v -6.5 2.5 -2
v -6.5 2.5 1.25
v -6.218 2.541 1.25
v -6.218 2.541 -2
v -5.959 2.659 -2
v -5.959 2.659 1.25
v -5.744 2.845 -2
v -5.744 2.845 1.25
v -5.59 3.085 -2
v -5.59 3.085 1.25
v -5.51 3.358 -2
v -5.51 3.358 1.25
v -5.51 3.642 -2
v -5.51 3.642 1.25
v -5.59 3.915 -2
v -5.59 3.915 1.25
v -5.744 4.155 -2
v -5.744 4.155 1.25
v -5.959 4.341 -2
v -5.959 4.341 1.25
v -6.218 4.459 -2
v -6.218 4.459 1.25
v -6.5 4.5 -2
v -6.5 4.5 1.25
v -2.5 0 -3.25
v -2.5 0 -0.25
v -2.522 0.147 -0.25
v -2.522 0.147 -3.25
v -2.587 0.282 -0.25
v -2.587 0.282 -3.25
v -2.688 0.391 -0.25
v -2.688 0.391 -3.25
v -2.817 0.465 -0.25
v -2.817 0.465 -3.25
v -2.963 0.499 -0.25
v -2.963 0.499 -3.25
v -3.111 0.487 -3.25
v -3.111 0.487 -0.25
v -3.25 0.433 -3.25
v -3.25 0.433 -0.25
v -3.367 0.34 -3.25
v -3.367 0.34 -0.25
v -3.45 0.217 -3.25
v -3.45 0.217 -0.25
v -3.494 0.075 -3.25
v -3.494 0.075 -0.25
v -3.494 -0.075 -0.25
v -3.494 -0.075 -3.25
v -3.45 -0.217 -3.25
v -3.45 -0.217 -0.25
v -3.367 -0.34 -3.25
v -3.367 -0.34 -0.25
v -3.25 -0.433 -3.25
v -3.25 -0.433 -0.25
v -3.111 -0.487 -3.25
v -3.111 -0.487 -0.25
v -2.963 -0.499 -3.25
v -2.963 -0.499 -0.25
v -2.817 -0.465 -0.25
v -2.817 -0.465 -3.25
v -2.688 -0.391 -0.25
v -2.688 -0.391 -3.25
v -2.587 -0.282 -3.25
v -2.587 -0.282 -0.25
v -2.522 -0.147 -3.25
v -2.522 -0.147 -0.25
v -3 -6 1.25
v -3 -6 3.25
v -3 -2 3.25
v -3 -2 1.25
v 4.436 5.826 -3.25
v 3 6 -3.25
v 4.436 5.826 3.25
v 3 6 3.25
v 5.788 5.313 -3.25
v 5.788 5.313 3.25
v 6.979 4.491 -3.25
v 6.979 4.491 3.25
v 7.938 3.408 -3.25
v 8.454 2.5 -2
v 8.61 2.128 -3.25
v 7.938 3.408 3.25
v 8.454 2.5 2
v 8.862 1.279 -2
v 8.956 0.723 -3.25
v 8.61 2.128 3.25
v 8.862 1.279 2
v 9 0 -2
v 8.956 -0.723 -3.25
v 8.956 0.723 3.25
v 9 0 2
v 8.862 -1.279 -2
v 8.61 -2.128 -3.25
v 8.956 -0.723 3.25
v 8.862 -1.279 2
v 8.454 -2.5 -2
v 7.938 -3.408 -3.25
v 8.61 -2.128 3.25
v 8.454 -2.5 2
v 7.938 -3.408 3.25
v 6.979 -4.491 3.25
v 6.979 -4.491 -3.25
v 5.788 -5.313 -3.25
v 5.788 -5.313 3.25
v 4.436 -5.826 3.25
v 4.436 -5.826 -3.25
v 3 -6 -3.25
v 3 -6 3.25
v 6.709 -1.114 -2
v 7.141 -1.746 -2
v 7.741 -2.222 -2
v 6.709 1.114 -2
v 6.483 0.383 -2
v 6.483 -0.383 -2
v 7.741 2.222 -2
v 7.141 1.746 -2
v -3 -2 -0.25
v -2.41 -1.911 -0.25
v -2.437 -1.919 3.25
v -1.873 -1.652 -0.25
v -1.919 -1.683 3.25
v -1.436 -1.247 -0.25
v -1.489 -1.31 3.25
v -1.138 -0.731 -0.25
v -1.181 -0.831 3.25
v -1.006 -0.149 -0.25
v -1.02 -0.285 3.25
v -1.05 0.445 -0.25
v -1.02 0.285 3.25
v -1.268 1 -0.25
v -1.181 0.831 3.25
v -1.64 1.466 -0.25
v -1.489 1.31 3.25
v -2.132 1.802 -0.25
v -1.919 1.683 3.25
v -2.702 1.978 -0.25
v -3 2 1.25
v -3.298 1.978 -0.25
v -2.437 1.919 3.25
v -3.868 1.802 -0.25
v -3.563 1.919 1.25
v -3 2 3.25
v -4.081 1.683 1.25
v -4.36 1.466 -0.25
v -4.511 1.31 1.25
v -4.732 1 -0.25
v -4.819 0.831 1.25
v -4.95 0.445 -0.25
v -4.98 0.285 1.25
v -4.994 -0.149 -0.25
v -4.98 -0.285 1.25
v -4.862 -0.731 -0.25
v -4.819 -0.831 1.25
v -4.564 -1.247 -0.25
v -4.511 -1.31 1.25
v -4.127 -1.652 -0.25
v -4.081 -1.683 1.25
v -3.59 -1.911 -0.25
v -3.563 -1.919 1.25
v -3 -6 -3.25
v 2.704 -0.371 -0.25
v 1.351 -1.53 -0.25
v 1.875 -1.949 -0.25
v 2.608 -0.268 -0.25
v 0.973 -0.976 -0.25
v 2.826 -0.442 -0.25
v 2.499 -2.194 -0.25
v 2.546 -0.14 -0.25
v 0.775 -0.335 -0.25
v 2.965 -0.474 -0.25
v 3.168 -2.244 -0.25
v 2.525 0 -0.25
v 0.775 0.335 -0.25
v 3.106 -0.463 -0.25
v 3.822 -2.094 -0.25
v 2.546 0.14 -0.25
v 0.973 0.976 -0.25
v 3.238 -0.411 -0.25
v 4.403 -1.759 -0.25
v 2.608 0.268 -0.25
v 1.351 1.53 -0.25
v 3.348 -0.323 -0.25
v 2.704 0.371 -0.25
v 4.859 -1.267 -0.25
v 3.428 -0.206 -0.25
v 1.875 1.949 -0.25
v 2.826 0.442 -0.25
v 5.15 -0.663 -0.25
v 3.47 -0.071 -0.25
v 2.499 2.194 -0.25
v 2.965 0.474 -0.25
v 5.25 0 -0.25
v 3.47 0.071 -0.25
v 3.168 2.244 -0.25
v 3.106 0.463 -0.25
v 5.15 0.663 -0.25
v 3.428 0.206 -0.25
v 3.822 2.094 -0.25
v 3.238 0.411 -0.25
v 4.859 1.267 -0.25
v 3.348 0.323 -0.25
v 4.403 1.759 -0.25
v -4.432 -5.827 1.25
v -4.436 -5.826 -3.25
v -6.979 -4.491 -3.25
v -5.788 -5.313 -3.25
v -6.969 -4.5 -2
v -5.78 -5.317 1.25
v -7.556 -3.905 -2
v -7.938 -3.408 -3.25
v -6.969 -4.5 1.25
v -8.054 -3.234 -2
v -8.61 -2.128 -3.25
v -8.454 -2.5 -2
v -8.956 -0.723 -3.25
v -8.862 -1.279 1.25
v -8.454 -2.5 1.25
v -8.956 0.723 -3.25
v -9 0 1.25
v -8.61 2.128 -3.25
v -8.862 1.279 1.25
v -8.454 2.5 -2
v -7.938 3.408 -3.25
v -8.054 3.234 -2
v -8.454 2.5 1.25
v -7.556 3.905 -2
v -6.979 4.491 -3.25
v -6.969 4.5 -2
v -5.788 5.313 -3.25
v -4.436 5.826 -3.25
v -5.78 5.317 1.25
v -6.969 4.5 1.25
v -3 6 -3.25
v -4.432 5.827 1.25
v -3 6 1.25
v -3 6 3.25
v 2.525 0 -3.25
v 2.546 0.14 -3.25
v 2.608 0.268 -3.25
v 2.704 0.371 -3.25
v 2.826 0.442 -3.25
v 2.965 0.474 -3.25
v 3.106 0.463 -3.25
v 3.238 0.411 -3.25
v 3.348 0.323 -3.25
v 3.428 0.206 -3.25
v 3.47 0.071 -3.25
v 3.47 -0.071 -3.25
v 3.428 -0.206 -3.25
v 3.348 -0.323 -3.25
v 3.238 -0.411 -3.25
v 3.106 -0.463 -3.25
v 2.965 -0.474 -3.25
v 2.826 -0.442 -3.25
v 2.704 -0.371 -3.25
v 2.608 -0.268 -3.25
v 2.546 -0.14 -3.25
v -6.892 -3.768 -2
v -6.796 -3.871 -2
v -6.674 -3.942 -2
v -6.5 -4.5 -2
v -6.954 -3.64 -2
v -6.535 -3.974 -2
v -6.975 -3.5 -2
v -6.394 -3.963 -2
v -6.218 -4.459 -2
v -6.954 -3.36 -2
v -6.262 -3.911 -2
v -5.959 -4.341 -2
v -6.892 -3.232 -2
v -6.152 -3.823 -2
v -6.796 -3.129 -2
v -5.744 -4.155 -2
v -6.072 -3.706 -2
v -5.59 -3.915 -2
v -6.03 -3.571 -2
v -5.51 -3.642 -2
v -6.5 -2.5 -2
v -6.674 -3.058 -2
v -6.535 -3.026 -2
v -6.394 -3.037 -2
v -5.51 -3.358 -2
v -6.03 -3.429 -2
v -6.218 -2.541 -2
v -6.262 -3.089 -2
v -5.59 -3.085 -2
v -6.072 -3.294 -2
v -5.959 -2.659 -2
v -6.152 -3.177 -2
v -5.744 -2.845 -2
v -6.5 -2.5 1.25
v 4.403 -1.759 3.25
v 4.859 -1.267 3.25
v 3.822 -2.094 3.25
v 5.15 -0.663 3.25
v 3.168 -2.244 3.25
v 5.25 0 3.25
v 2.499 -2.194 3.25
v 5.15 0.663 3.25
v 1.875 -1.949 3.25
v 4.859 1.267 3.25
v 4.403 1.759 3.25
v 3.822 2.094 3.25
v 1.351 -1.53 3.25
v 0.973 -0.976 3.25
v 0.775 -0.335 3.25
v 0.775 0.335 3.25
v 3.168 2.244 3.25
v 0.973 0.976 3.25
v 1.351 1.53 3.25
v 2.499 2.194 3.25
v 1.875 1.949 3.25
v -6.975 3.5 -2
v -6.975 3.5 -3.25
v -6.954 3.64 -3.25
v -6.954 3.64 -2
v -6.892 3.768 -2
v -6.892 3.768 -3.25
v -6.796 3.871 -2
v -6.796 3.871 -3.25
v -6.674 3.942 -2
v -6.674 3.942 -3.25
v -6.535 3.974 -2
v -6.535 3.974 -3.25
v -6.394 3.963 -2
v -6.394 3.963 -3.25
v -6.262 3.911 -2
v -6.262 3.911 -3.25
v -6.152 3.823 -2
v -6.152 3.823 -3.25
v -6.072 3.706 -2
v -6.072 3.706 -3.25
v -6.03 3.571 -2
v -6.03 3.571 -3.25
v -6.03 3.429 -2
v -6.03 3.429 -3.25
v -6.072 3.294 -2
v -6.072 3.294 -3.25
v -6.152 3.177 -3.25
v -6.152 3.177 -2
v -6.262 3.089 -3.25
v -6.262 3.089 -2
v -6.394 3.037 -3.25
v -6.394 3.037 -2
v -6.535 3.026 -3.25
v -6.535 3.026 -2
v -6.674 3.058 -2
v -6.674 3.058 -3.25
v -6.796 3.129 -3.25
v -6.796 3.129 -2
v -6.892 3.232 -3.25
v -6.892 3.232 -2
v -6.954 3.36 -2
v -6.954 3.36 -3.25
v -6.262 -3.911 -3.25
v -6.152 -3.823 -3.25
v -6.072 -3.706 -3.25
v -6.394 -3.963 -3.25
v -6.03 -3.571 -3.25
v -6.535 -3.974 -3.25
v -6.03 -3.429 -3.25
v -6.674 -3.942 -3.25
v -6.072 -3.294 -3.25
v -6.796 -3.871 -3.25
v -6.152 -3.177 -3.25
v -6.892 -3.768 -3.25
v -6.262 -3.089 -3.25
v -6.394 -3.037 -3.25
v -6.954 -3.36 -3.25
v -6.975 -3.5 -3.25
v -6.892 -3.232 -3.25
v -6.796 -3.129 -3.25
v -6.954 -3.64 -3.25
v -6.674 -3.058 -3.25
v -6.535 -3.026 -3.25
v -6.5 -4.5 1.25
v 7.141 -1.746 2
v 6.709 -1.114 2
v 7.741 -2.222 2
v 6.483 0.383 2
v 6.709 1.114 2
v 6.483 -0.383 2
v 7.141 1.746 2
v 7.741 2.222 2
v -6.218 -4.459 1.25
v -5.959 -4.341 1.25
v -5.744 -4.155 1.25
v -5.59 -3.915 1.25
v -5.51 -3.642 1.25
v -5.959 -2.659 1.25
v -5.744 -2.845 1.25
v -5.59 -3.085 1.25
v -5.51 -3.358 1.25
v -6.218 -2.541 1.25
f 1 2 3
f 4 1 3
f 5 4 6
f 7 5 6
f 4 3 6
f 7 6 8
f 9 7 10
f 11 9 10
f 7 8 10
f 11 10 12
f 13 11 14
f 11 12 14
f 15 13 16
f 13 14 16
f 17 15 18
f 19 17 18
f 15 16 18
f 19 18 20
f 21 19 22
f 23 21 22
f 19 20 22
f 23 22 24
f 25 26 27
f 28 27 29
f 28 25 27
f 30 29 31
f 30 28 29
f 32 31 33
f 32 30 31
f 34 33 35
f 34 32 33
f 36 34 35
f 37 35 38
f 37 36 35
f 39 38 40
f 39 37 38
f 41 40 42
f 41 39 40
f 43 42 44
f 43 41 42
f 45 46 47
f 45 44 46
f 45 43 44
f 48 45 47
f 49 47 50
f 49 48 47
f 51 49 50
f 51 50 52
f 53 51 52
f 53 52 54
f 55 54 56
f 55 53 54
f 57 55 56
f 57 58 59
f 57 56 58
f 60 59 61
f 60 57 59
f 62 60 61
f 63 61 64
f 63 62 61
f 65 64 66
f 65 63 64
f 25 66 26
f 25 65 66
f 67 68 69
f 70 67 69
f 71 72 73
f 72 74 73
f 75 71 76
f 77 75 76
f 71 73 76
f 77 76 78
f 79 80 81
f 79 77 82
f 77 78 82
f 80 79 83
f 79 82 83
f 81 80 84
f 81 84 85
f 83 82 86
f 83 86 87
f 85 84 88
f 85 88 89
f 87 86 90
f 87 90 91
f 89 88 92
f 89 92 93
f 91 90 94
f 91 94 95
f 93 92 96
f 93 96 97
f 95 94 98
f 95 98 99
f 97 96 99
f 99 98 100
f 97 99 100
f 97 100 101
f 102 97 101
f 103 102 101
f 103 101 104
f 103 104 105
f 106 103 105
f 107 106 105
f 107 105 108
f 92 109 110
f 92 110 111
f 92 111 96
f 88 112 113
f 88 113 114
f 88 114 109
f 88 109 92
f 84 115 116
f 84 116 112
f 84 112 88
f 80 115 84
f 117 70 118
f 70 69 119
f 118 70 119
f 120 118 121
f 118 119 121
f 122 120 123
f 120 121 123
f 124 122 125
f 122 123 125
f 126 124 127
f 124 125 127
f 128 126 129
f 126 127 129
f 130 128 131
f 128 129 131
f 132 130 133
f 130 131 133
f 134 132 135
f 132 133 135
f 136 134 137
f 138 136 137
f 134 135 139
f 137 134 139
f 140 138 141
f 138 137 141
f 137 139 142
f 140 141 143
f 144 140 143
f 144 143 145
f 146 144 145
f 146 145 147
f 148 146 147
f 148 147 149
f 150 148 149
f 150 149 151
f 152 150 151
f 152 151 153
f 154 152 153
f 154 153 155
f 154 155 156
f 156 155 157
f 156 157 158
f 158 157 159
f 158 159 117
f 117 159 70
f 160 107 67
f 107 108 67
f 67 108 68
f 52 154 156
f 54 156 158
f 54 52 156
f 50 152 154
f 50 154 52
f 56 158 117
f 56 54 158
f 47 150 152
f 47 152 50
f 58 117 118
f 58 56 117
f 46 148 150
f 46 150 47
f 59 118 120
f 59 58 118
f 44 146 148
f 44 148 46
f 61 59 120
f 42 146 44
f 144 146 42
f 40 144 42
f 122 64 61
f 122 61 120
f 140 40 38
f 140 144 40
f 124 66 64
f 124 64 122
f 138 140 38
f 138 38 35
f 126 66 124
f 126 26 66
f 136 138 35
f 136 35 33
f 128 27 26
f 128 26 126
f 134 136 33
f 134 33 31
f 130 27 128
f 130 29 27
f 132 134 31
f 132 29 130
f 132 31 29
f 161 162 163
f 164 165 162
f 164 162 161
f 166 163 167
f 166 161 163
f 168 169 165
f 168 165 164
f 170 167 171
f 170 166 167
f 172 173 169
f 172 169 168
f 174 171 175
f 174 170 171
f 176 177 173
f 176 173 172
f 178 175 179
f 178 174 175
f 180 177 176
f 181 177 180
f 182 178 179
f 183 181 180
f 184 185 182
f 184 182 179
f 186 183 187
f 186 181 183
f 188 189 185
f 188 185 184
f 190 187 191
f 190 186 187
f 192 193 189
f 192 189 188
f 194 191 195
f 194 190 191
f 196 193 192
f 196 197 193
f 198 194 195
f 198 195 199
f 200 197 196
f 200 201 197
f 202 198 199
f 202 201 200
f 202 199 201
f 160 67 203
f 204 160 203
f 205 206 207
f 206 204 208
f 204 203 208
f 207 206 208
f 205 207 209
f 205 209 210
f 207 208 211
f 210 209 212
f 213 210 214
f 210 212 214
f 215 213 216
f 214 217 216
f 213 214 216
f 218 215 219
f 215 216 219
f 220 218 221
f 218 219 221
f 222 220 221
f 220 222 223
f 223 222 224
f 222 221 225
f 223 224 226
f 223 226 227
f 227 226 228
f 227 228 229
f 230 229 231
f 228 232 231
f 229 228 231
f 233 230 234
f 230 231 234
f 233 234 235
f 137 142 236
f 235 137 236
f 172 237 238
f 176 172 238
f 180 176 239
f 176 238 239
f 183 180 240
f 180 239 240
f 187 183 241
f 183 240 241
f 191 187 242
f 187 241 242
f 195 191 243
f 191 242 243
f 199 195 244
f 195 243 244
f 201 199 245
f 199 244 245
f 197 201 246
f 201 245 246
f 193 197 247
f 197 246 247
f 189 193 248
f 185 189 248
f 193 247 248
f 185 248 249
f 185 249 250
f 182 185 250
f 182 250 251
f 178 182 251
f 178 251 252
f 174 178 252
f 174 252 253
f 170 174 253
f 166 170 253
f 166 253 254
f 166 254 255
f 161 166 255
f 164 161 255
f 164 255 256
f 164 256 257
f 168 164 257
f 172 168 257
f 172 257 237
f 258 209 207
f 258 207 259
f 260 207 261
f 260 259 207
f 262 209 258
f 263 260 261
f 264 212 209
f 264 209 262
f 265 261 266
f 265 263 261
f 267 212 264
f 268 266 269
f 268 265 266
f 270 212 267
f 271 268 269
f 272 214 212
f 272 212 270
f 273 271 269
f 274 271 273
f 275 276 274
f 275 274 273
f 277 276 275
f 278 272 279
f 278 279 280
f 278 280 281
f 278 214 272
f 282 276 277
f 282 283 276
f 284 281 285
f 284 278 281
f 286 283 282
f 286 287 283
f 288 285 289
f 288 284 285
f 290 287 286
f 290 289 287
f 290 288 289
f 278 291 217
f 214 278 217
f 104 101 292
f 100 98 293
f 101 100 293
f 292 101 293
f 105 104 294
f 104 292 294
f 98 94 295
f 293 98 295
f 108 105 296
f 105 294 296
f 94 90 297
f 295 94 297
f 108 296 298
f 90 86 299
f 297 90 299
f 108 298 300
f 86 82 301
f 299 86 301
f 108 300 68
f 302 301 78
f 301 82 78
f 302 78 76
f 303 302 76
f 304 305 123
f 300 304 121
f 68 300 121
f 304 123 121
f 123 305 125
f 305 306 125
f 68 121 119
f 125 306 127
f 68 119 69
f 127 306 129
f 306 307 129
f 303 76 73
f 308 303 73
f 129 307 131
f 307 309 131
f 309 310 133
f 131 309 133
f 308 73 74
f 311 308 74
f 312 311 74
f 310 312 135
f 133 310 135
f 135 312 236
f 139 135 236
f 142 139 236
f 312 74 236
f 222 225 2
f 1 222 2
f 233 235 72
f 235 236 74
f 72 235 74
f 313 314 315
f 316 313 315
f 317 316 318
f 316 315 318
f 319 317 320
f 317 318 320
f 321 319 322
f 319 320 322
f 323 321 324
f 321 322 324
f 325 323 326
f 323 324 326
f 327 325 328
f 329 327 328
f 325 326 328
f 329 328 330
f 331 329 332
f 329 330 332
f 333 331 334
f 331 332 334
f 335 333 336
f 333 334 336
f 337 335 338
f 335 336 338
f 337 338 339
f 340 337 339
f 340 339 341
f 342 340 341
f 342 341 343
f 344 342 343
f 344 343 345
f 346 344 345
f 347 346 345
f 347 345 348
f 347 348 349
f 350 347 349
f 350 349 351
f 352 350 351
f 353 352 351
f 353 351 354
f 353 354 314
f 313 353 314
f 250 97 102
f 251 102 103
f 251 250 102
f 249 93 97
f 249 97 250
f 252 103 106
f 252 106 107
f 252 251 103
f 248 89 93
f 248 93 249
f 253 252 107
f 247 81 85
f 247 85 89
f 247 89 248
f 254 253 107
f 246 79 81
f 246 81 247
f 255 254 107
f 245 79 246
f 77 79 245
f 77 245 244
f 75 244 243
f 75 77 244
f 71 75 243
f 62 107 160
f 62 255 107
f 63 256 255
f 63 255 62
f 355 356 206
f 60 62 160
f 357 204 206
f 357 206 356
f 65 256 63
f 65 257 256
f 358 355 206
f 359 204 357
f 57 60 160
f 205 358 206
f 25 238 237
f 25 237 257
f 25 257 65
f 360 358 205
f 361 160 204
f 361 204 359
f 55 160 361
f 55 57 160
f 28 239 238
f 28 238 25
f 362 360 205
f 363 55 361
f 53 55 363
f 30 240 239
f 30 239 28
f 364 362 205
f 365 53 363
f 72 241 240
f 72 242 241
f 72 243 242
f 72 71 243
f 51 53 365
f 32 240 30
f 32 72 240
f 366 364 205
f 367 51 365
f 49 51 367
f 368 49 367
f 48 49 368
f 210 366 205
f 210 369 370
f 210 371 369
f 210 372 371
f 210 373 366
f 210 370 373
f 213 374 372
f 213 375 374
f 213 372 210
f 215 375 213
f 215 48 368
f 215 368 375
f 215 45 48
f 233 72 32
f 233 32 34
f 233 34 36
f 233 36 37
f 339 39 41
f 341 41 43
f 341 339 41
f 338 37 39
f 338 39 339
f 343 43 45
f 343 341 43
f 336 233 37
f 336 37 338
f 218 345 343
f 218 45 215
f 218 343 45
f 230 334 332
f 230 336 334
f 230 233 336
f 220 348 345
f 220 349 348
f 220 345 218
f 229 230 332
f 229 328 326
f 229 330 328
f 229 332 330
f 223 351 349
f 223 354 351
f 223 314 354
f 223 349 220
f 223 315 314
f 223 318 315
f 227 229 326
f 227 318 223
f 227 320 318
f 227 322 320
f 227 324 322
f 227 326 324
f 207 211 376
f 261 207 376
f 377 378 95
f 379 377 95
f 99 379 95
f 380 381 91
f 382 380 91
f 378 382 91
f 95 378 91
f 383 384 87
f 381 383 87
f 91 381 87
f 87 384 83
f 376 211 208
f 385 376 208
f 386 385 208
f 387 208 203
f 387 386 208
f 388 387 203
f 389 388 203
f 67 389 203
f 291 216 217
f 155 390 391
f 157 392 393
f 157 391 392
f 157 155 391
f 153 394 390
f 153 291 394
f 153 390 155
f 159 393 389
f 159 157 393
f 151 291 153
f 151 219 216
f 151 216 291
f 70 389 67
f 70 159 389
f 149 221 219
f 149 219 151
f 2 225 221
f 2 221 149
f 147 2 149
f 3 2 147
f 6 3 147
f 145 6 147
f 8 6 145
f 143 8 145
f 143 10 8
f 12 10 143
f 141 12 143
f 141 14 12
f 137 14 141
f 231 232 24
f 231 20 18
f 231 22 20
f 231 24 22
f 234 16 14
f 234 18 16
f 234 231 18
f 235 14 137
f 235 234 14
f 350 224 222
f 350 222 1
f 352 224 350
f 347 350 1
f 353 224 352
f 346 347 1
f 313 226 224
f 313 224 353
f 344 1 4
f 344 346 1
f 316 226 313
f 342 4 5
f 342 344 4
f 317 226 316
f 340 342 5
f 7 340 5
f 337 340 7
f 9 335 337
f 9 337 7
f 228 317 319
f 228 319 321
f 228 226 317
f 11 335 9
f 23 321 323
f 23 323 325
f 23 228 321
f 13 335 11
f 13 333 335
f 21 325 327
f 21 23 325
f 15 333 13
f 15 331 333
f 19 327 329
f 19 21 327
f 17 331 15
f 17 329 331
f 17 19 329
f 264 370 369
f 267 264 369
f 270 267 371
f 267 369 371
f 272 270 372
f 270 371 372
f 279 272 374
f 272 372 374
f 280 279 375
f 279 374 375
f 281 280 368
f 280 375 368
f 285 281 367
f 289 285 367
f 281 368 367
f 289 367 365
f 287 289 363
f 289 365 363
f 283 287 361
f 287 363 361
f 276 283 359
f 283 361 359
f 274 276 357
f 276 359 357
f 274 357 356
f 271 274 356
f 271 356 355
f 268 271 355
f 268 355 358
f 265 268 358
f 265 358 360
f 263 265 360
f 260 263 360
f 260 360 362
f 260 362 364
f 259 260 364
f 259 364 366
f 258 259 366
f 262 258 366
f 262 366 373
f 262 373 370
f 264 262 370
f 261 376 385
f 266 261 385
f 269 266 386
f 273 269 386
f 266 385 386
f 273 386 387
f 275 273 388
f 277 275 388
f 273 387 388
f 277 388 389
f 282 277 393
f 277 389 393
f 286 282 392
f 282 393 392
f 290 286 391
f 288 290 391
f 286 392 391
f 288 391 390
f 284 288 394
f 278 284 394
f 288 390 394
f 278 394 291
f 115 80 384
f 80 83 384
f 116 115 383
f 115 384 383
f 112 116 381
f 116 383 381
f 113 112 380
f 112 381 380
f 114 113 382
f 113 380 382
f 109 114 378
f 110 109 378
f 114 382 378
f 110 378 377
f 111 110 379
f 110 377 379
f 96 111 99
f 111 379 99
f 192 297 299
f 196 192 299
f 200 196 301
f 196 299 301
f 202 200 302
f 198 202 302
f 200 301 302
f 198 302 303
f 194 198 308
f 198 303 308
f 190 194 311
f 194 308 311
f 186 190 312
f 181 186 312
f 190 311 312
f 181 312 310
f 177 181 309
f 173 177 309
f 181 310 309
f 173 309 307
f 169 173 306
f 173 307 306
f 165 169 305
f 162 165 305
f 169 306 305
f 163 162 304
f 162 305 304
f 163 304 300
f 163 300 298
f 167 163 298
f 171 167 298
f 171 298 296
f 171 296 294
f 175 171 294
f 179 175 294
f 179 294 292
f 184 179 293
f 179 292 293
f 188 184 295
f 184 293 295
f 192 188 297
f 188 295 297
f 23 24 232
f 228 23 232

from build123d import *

# Parameters (mm, degrees)
SKETCH1_R                              = 0.5
BOSS_EXTRUDE1_DEPTH                    = 3.25
CUT_EXTRUDE1_DEPTH                     = 2
SKETCH3_W                              = 9.709711208
SKETCH3_H                              = 13.055758796
CUT_EXTRUDE2_DEPTH                     = 2
CUT_EXTRUDE3_DEPTH                     = 3.5
SKETCH5_R                              = 2.25
CUT_EXTRUDE4_DEPTH                     = 3.5
CUT_EXTRUDE5_DEPTH                     = 3.25
M1_2X0_25_TAPPED_HOLE1_D               = 0.95
M1_2X0_25_TAPPED_HOLE1_DEPTH           = 13.65
M1_2X0_25_TAPPED_HOLE1_TIP             = 0.285408794
M1_2X0_25_TAPPED_HOLE1_ON_FACE_2_D     = 0.95
M1_2X0_25_TAPPED_HOLE1_ON_FACE_2_DEPTH = 13.65
M1_2X0_25_TAPPED_HOLE1_ON_FACE_2_TIP   = 0.285408794


with BuildPart() as part:
    # Sketch1 → Boss-Extrude1 (new, symmetric)
    with BuildSketch(Plane.XY):
        with BuildLine():
            Line((-3, 6), (3, 6))
            ThreePointArc((3, 6), (9, 0), (3, -6))
            Line((3, -6), (-3, -6))
            ThreePointArc((-3, -6), (-9, 0), (-3, 6))
        make_face()
        with Locations((-3, 0)):
            Circle(SKETCH1_R, mode=Mode.SUBTRACT)
    extrude(amount=BOSS_EXTRUDE1_DEPTH, both=True)

    # Sketch2 → Cut-Extrude1 (cut, symmetric)
    with BuildSketch(Plane.XY):
        with BuildLine():
            ThreePointArc((8.454356057, 2.5), (6.454356057, 0), (8.454356057, -2.5))
            ThreePointArc((8.454356057, -2.5), (9, 0), (8.454356057, 2.5))
        make_face()
    extrude(amount=CUT_EXTRUDE1_DEPTH, both=True, mode=Mode.SUBTRACT)

    # Sketch3 → Cut-Extrude2 (cut)
    with BuildSketch(Plane.XY.offset(3.25)):
        with Locations((-7.854855604, -0.527879398)):
            Rectangle(SKETCH3_W, SKETCH3_H)
    extrude(amount=-CUT_EXTRUDE2_DEPTH, mode=Mode.SUBTRACT)

    # Sketch4 → Cut-Extrude3 (cut)
    with BuildSketch(Plane.XY.offset(3.25)):
        with BuildLine():
            ThreePointArc((-3, 2), (-5, 0), (-3, -2))
            ThreePointArc((-3, -2), (-1, 0), (-3, 2))
        make_face()
    extrude(amount=-CUT_EXTRUDE3_DEPTH, mode=Mode.SUBTRACT)

    # Sketch5 → Cut-Extrude4 (cut)
    with BuildSketch(Plane.XY.offset(3.25)):
        with Locations((3, 0)):
            Circle(SKETCH5_R)
    extrude(amount=-CUT_EXTRUDE4_DEPTH, mode=Mode.SUBTRACT)

    # Sketch6 → Cut-Extrude5 (cut)
    with BuildSketch(Plane.XY.offset(1.25)):
        with BuildLine():
            ThreePointArc((-6.5, -4.5), (-5.5, -3.5), (-6.5, -2.5))
            Line((-6.5, -2.5), (-8.454356057, -2.5))
            ThreePointArc((-8.454356057, -2.5), (-7.81644602, -3.577966983), (-6.968626967, -4.5))
            Line((-6.968626967, -4.5), (-6.5, -4.5))
        make_face()
        with BuildLine():
            ThreePointArc((-6.5, 2.5), (-5.5, 3.5), (-6.5, 4.5))
            Line((-6.5, 4.5), (-6.968626967, 4.5))
            ThreePointArc((-6.968626967, 4.5), (-7.81644602, 3.577966983), (-8.454356057, 2.5))
            Line((-8.454356057, 2.5), (-6.5, 2.5))
        make_face()
    extrude(amount=-CUT_EXTRUDE5_DEPTH, mode=Mode.SUBTRACT)

    # M1.2x0.25 Tapped Hole1
    with Locations(Plane(origin=(3, 0, -0.25), x_dir=(1, 0, 0), z_dir=(0, 0, 1))):
        with Locations((0, 0)):
            Hole(M1_2X0_25_TAPPED_HOLE1_D / 2, depth=M1_2X0_25_TAPPED_HOLE1_DEPTH)
            with Locations((0, 0, -(M1_2X0_25_TAPPED_HOLE1_DEPTH + M1_2X0_25_TAPPED_HOLE1_TIP / 2))):  # 118° drill point
                Cone(0, M1_2X0_25_TAPPED_HOLE1_D / 2, M1_2X0_25_TAPPED_HOLE1_TIP, mode=Mode.SUBTRACT)

    # M1.2x0.25 Tapped Hole1 on face 2
    with Locations(Plane(origin=(-6.5, 3.5, -2), x_dir=(1, 0, 0), z_dir=(0, 0, 1))):
        with Locations((0, 0), (0, -7)):
            Hole(M1_2X0_25_TAPPED_HOLE1_ON_FACE_2_D / 2, depth=M1_2X0_25_TAPPED_HOLE1_ON_FACE_2_DEPTH)
            with Locations((0, 0, -(M1_2X0_25_TAPPED_HOLE1_ON_FACE_2_DEPTH + M1_2X0_25_TAPPED_HOLE1_ON_FACE_2_TIP / 2))):  # 118° drill point
                Cone(0, M1_2X0_25_TAPPED_HOLE1_ON_FACE_2_D / 2, M1_2X0_25_TAPPED_HOLE1_ON_FACE_2_TIP, mode=Mode.SUBTRACT)


solid = part.part
